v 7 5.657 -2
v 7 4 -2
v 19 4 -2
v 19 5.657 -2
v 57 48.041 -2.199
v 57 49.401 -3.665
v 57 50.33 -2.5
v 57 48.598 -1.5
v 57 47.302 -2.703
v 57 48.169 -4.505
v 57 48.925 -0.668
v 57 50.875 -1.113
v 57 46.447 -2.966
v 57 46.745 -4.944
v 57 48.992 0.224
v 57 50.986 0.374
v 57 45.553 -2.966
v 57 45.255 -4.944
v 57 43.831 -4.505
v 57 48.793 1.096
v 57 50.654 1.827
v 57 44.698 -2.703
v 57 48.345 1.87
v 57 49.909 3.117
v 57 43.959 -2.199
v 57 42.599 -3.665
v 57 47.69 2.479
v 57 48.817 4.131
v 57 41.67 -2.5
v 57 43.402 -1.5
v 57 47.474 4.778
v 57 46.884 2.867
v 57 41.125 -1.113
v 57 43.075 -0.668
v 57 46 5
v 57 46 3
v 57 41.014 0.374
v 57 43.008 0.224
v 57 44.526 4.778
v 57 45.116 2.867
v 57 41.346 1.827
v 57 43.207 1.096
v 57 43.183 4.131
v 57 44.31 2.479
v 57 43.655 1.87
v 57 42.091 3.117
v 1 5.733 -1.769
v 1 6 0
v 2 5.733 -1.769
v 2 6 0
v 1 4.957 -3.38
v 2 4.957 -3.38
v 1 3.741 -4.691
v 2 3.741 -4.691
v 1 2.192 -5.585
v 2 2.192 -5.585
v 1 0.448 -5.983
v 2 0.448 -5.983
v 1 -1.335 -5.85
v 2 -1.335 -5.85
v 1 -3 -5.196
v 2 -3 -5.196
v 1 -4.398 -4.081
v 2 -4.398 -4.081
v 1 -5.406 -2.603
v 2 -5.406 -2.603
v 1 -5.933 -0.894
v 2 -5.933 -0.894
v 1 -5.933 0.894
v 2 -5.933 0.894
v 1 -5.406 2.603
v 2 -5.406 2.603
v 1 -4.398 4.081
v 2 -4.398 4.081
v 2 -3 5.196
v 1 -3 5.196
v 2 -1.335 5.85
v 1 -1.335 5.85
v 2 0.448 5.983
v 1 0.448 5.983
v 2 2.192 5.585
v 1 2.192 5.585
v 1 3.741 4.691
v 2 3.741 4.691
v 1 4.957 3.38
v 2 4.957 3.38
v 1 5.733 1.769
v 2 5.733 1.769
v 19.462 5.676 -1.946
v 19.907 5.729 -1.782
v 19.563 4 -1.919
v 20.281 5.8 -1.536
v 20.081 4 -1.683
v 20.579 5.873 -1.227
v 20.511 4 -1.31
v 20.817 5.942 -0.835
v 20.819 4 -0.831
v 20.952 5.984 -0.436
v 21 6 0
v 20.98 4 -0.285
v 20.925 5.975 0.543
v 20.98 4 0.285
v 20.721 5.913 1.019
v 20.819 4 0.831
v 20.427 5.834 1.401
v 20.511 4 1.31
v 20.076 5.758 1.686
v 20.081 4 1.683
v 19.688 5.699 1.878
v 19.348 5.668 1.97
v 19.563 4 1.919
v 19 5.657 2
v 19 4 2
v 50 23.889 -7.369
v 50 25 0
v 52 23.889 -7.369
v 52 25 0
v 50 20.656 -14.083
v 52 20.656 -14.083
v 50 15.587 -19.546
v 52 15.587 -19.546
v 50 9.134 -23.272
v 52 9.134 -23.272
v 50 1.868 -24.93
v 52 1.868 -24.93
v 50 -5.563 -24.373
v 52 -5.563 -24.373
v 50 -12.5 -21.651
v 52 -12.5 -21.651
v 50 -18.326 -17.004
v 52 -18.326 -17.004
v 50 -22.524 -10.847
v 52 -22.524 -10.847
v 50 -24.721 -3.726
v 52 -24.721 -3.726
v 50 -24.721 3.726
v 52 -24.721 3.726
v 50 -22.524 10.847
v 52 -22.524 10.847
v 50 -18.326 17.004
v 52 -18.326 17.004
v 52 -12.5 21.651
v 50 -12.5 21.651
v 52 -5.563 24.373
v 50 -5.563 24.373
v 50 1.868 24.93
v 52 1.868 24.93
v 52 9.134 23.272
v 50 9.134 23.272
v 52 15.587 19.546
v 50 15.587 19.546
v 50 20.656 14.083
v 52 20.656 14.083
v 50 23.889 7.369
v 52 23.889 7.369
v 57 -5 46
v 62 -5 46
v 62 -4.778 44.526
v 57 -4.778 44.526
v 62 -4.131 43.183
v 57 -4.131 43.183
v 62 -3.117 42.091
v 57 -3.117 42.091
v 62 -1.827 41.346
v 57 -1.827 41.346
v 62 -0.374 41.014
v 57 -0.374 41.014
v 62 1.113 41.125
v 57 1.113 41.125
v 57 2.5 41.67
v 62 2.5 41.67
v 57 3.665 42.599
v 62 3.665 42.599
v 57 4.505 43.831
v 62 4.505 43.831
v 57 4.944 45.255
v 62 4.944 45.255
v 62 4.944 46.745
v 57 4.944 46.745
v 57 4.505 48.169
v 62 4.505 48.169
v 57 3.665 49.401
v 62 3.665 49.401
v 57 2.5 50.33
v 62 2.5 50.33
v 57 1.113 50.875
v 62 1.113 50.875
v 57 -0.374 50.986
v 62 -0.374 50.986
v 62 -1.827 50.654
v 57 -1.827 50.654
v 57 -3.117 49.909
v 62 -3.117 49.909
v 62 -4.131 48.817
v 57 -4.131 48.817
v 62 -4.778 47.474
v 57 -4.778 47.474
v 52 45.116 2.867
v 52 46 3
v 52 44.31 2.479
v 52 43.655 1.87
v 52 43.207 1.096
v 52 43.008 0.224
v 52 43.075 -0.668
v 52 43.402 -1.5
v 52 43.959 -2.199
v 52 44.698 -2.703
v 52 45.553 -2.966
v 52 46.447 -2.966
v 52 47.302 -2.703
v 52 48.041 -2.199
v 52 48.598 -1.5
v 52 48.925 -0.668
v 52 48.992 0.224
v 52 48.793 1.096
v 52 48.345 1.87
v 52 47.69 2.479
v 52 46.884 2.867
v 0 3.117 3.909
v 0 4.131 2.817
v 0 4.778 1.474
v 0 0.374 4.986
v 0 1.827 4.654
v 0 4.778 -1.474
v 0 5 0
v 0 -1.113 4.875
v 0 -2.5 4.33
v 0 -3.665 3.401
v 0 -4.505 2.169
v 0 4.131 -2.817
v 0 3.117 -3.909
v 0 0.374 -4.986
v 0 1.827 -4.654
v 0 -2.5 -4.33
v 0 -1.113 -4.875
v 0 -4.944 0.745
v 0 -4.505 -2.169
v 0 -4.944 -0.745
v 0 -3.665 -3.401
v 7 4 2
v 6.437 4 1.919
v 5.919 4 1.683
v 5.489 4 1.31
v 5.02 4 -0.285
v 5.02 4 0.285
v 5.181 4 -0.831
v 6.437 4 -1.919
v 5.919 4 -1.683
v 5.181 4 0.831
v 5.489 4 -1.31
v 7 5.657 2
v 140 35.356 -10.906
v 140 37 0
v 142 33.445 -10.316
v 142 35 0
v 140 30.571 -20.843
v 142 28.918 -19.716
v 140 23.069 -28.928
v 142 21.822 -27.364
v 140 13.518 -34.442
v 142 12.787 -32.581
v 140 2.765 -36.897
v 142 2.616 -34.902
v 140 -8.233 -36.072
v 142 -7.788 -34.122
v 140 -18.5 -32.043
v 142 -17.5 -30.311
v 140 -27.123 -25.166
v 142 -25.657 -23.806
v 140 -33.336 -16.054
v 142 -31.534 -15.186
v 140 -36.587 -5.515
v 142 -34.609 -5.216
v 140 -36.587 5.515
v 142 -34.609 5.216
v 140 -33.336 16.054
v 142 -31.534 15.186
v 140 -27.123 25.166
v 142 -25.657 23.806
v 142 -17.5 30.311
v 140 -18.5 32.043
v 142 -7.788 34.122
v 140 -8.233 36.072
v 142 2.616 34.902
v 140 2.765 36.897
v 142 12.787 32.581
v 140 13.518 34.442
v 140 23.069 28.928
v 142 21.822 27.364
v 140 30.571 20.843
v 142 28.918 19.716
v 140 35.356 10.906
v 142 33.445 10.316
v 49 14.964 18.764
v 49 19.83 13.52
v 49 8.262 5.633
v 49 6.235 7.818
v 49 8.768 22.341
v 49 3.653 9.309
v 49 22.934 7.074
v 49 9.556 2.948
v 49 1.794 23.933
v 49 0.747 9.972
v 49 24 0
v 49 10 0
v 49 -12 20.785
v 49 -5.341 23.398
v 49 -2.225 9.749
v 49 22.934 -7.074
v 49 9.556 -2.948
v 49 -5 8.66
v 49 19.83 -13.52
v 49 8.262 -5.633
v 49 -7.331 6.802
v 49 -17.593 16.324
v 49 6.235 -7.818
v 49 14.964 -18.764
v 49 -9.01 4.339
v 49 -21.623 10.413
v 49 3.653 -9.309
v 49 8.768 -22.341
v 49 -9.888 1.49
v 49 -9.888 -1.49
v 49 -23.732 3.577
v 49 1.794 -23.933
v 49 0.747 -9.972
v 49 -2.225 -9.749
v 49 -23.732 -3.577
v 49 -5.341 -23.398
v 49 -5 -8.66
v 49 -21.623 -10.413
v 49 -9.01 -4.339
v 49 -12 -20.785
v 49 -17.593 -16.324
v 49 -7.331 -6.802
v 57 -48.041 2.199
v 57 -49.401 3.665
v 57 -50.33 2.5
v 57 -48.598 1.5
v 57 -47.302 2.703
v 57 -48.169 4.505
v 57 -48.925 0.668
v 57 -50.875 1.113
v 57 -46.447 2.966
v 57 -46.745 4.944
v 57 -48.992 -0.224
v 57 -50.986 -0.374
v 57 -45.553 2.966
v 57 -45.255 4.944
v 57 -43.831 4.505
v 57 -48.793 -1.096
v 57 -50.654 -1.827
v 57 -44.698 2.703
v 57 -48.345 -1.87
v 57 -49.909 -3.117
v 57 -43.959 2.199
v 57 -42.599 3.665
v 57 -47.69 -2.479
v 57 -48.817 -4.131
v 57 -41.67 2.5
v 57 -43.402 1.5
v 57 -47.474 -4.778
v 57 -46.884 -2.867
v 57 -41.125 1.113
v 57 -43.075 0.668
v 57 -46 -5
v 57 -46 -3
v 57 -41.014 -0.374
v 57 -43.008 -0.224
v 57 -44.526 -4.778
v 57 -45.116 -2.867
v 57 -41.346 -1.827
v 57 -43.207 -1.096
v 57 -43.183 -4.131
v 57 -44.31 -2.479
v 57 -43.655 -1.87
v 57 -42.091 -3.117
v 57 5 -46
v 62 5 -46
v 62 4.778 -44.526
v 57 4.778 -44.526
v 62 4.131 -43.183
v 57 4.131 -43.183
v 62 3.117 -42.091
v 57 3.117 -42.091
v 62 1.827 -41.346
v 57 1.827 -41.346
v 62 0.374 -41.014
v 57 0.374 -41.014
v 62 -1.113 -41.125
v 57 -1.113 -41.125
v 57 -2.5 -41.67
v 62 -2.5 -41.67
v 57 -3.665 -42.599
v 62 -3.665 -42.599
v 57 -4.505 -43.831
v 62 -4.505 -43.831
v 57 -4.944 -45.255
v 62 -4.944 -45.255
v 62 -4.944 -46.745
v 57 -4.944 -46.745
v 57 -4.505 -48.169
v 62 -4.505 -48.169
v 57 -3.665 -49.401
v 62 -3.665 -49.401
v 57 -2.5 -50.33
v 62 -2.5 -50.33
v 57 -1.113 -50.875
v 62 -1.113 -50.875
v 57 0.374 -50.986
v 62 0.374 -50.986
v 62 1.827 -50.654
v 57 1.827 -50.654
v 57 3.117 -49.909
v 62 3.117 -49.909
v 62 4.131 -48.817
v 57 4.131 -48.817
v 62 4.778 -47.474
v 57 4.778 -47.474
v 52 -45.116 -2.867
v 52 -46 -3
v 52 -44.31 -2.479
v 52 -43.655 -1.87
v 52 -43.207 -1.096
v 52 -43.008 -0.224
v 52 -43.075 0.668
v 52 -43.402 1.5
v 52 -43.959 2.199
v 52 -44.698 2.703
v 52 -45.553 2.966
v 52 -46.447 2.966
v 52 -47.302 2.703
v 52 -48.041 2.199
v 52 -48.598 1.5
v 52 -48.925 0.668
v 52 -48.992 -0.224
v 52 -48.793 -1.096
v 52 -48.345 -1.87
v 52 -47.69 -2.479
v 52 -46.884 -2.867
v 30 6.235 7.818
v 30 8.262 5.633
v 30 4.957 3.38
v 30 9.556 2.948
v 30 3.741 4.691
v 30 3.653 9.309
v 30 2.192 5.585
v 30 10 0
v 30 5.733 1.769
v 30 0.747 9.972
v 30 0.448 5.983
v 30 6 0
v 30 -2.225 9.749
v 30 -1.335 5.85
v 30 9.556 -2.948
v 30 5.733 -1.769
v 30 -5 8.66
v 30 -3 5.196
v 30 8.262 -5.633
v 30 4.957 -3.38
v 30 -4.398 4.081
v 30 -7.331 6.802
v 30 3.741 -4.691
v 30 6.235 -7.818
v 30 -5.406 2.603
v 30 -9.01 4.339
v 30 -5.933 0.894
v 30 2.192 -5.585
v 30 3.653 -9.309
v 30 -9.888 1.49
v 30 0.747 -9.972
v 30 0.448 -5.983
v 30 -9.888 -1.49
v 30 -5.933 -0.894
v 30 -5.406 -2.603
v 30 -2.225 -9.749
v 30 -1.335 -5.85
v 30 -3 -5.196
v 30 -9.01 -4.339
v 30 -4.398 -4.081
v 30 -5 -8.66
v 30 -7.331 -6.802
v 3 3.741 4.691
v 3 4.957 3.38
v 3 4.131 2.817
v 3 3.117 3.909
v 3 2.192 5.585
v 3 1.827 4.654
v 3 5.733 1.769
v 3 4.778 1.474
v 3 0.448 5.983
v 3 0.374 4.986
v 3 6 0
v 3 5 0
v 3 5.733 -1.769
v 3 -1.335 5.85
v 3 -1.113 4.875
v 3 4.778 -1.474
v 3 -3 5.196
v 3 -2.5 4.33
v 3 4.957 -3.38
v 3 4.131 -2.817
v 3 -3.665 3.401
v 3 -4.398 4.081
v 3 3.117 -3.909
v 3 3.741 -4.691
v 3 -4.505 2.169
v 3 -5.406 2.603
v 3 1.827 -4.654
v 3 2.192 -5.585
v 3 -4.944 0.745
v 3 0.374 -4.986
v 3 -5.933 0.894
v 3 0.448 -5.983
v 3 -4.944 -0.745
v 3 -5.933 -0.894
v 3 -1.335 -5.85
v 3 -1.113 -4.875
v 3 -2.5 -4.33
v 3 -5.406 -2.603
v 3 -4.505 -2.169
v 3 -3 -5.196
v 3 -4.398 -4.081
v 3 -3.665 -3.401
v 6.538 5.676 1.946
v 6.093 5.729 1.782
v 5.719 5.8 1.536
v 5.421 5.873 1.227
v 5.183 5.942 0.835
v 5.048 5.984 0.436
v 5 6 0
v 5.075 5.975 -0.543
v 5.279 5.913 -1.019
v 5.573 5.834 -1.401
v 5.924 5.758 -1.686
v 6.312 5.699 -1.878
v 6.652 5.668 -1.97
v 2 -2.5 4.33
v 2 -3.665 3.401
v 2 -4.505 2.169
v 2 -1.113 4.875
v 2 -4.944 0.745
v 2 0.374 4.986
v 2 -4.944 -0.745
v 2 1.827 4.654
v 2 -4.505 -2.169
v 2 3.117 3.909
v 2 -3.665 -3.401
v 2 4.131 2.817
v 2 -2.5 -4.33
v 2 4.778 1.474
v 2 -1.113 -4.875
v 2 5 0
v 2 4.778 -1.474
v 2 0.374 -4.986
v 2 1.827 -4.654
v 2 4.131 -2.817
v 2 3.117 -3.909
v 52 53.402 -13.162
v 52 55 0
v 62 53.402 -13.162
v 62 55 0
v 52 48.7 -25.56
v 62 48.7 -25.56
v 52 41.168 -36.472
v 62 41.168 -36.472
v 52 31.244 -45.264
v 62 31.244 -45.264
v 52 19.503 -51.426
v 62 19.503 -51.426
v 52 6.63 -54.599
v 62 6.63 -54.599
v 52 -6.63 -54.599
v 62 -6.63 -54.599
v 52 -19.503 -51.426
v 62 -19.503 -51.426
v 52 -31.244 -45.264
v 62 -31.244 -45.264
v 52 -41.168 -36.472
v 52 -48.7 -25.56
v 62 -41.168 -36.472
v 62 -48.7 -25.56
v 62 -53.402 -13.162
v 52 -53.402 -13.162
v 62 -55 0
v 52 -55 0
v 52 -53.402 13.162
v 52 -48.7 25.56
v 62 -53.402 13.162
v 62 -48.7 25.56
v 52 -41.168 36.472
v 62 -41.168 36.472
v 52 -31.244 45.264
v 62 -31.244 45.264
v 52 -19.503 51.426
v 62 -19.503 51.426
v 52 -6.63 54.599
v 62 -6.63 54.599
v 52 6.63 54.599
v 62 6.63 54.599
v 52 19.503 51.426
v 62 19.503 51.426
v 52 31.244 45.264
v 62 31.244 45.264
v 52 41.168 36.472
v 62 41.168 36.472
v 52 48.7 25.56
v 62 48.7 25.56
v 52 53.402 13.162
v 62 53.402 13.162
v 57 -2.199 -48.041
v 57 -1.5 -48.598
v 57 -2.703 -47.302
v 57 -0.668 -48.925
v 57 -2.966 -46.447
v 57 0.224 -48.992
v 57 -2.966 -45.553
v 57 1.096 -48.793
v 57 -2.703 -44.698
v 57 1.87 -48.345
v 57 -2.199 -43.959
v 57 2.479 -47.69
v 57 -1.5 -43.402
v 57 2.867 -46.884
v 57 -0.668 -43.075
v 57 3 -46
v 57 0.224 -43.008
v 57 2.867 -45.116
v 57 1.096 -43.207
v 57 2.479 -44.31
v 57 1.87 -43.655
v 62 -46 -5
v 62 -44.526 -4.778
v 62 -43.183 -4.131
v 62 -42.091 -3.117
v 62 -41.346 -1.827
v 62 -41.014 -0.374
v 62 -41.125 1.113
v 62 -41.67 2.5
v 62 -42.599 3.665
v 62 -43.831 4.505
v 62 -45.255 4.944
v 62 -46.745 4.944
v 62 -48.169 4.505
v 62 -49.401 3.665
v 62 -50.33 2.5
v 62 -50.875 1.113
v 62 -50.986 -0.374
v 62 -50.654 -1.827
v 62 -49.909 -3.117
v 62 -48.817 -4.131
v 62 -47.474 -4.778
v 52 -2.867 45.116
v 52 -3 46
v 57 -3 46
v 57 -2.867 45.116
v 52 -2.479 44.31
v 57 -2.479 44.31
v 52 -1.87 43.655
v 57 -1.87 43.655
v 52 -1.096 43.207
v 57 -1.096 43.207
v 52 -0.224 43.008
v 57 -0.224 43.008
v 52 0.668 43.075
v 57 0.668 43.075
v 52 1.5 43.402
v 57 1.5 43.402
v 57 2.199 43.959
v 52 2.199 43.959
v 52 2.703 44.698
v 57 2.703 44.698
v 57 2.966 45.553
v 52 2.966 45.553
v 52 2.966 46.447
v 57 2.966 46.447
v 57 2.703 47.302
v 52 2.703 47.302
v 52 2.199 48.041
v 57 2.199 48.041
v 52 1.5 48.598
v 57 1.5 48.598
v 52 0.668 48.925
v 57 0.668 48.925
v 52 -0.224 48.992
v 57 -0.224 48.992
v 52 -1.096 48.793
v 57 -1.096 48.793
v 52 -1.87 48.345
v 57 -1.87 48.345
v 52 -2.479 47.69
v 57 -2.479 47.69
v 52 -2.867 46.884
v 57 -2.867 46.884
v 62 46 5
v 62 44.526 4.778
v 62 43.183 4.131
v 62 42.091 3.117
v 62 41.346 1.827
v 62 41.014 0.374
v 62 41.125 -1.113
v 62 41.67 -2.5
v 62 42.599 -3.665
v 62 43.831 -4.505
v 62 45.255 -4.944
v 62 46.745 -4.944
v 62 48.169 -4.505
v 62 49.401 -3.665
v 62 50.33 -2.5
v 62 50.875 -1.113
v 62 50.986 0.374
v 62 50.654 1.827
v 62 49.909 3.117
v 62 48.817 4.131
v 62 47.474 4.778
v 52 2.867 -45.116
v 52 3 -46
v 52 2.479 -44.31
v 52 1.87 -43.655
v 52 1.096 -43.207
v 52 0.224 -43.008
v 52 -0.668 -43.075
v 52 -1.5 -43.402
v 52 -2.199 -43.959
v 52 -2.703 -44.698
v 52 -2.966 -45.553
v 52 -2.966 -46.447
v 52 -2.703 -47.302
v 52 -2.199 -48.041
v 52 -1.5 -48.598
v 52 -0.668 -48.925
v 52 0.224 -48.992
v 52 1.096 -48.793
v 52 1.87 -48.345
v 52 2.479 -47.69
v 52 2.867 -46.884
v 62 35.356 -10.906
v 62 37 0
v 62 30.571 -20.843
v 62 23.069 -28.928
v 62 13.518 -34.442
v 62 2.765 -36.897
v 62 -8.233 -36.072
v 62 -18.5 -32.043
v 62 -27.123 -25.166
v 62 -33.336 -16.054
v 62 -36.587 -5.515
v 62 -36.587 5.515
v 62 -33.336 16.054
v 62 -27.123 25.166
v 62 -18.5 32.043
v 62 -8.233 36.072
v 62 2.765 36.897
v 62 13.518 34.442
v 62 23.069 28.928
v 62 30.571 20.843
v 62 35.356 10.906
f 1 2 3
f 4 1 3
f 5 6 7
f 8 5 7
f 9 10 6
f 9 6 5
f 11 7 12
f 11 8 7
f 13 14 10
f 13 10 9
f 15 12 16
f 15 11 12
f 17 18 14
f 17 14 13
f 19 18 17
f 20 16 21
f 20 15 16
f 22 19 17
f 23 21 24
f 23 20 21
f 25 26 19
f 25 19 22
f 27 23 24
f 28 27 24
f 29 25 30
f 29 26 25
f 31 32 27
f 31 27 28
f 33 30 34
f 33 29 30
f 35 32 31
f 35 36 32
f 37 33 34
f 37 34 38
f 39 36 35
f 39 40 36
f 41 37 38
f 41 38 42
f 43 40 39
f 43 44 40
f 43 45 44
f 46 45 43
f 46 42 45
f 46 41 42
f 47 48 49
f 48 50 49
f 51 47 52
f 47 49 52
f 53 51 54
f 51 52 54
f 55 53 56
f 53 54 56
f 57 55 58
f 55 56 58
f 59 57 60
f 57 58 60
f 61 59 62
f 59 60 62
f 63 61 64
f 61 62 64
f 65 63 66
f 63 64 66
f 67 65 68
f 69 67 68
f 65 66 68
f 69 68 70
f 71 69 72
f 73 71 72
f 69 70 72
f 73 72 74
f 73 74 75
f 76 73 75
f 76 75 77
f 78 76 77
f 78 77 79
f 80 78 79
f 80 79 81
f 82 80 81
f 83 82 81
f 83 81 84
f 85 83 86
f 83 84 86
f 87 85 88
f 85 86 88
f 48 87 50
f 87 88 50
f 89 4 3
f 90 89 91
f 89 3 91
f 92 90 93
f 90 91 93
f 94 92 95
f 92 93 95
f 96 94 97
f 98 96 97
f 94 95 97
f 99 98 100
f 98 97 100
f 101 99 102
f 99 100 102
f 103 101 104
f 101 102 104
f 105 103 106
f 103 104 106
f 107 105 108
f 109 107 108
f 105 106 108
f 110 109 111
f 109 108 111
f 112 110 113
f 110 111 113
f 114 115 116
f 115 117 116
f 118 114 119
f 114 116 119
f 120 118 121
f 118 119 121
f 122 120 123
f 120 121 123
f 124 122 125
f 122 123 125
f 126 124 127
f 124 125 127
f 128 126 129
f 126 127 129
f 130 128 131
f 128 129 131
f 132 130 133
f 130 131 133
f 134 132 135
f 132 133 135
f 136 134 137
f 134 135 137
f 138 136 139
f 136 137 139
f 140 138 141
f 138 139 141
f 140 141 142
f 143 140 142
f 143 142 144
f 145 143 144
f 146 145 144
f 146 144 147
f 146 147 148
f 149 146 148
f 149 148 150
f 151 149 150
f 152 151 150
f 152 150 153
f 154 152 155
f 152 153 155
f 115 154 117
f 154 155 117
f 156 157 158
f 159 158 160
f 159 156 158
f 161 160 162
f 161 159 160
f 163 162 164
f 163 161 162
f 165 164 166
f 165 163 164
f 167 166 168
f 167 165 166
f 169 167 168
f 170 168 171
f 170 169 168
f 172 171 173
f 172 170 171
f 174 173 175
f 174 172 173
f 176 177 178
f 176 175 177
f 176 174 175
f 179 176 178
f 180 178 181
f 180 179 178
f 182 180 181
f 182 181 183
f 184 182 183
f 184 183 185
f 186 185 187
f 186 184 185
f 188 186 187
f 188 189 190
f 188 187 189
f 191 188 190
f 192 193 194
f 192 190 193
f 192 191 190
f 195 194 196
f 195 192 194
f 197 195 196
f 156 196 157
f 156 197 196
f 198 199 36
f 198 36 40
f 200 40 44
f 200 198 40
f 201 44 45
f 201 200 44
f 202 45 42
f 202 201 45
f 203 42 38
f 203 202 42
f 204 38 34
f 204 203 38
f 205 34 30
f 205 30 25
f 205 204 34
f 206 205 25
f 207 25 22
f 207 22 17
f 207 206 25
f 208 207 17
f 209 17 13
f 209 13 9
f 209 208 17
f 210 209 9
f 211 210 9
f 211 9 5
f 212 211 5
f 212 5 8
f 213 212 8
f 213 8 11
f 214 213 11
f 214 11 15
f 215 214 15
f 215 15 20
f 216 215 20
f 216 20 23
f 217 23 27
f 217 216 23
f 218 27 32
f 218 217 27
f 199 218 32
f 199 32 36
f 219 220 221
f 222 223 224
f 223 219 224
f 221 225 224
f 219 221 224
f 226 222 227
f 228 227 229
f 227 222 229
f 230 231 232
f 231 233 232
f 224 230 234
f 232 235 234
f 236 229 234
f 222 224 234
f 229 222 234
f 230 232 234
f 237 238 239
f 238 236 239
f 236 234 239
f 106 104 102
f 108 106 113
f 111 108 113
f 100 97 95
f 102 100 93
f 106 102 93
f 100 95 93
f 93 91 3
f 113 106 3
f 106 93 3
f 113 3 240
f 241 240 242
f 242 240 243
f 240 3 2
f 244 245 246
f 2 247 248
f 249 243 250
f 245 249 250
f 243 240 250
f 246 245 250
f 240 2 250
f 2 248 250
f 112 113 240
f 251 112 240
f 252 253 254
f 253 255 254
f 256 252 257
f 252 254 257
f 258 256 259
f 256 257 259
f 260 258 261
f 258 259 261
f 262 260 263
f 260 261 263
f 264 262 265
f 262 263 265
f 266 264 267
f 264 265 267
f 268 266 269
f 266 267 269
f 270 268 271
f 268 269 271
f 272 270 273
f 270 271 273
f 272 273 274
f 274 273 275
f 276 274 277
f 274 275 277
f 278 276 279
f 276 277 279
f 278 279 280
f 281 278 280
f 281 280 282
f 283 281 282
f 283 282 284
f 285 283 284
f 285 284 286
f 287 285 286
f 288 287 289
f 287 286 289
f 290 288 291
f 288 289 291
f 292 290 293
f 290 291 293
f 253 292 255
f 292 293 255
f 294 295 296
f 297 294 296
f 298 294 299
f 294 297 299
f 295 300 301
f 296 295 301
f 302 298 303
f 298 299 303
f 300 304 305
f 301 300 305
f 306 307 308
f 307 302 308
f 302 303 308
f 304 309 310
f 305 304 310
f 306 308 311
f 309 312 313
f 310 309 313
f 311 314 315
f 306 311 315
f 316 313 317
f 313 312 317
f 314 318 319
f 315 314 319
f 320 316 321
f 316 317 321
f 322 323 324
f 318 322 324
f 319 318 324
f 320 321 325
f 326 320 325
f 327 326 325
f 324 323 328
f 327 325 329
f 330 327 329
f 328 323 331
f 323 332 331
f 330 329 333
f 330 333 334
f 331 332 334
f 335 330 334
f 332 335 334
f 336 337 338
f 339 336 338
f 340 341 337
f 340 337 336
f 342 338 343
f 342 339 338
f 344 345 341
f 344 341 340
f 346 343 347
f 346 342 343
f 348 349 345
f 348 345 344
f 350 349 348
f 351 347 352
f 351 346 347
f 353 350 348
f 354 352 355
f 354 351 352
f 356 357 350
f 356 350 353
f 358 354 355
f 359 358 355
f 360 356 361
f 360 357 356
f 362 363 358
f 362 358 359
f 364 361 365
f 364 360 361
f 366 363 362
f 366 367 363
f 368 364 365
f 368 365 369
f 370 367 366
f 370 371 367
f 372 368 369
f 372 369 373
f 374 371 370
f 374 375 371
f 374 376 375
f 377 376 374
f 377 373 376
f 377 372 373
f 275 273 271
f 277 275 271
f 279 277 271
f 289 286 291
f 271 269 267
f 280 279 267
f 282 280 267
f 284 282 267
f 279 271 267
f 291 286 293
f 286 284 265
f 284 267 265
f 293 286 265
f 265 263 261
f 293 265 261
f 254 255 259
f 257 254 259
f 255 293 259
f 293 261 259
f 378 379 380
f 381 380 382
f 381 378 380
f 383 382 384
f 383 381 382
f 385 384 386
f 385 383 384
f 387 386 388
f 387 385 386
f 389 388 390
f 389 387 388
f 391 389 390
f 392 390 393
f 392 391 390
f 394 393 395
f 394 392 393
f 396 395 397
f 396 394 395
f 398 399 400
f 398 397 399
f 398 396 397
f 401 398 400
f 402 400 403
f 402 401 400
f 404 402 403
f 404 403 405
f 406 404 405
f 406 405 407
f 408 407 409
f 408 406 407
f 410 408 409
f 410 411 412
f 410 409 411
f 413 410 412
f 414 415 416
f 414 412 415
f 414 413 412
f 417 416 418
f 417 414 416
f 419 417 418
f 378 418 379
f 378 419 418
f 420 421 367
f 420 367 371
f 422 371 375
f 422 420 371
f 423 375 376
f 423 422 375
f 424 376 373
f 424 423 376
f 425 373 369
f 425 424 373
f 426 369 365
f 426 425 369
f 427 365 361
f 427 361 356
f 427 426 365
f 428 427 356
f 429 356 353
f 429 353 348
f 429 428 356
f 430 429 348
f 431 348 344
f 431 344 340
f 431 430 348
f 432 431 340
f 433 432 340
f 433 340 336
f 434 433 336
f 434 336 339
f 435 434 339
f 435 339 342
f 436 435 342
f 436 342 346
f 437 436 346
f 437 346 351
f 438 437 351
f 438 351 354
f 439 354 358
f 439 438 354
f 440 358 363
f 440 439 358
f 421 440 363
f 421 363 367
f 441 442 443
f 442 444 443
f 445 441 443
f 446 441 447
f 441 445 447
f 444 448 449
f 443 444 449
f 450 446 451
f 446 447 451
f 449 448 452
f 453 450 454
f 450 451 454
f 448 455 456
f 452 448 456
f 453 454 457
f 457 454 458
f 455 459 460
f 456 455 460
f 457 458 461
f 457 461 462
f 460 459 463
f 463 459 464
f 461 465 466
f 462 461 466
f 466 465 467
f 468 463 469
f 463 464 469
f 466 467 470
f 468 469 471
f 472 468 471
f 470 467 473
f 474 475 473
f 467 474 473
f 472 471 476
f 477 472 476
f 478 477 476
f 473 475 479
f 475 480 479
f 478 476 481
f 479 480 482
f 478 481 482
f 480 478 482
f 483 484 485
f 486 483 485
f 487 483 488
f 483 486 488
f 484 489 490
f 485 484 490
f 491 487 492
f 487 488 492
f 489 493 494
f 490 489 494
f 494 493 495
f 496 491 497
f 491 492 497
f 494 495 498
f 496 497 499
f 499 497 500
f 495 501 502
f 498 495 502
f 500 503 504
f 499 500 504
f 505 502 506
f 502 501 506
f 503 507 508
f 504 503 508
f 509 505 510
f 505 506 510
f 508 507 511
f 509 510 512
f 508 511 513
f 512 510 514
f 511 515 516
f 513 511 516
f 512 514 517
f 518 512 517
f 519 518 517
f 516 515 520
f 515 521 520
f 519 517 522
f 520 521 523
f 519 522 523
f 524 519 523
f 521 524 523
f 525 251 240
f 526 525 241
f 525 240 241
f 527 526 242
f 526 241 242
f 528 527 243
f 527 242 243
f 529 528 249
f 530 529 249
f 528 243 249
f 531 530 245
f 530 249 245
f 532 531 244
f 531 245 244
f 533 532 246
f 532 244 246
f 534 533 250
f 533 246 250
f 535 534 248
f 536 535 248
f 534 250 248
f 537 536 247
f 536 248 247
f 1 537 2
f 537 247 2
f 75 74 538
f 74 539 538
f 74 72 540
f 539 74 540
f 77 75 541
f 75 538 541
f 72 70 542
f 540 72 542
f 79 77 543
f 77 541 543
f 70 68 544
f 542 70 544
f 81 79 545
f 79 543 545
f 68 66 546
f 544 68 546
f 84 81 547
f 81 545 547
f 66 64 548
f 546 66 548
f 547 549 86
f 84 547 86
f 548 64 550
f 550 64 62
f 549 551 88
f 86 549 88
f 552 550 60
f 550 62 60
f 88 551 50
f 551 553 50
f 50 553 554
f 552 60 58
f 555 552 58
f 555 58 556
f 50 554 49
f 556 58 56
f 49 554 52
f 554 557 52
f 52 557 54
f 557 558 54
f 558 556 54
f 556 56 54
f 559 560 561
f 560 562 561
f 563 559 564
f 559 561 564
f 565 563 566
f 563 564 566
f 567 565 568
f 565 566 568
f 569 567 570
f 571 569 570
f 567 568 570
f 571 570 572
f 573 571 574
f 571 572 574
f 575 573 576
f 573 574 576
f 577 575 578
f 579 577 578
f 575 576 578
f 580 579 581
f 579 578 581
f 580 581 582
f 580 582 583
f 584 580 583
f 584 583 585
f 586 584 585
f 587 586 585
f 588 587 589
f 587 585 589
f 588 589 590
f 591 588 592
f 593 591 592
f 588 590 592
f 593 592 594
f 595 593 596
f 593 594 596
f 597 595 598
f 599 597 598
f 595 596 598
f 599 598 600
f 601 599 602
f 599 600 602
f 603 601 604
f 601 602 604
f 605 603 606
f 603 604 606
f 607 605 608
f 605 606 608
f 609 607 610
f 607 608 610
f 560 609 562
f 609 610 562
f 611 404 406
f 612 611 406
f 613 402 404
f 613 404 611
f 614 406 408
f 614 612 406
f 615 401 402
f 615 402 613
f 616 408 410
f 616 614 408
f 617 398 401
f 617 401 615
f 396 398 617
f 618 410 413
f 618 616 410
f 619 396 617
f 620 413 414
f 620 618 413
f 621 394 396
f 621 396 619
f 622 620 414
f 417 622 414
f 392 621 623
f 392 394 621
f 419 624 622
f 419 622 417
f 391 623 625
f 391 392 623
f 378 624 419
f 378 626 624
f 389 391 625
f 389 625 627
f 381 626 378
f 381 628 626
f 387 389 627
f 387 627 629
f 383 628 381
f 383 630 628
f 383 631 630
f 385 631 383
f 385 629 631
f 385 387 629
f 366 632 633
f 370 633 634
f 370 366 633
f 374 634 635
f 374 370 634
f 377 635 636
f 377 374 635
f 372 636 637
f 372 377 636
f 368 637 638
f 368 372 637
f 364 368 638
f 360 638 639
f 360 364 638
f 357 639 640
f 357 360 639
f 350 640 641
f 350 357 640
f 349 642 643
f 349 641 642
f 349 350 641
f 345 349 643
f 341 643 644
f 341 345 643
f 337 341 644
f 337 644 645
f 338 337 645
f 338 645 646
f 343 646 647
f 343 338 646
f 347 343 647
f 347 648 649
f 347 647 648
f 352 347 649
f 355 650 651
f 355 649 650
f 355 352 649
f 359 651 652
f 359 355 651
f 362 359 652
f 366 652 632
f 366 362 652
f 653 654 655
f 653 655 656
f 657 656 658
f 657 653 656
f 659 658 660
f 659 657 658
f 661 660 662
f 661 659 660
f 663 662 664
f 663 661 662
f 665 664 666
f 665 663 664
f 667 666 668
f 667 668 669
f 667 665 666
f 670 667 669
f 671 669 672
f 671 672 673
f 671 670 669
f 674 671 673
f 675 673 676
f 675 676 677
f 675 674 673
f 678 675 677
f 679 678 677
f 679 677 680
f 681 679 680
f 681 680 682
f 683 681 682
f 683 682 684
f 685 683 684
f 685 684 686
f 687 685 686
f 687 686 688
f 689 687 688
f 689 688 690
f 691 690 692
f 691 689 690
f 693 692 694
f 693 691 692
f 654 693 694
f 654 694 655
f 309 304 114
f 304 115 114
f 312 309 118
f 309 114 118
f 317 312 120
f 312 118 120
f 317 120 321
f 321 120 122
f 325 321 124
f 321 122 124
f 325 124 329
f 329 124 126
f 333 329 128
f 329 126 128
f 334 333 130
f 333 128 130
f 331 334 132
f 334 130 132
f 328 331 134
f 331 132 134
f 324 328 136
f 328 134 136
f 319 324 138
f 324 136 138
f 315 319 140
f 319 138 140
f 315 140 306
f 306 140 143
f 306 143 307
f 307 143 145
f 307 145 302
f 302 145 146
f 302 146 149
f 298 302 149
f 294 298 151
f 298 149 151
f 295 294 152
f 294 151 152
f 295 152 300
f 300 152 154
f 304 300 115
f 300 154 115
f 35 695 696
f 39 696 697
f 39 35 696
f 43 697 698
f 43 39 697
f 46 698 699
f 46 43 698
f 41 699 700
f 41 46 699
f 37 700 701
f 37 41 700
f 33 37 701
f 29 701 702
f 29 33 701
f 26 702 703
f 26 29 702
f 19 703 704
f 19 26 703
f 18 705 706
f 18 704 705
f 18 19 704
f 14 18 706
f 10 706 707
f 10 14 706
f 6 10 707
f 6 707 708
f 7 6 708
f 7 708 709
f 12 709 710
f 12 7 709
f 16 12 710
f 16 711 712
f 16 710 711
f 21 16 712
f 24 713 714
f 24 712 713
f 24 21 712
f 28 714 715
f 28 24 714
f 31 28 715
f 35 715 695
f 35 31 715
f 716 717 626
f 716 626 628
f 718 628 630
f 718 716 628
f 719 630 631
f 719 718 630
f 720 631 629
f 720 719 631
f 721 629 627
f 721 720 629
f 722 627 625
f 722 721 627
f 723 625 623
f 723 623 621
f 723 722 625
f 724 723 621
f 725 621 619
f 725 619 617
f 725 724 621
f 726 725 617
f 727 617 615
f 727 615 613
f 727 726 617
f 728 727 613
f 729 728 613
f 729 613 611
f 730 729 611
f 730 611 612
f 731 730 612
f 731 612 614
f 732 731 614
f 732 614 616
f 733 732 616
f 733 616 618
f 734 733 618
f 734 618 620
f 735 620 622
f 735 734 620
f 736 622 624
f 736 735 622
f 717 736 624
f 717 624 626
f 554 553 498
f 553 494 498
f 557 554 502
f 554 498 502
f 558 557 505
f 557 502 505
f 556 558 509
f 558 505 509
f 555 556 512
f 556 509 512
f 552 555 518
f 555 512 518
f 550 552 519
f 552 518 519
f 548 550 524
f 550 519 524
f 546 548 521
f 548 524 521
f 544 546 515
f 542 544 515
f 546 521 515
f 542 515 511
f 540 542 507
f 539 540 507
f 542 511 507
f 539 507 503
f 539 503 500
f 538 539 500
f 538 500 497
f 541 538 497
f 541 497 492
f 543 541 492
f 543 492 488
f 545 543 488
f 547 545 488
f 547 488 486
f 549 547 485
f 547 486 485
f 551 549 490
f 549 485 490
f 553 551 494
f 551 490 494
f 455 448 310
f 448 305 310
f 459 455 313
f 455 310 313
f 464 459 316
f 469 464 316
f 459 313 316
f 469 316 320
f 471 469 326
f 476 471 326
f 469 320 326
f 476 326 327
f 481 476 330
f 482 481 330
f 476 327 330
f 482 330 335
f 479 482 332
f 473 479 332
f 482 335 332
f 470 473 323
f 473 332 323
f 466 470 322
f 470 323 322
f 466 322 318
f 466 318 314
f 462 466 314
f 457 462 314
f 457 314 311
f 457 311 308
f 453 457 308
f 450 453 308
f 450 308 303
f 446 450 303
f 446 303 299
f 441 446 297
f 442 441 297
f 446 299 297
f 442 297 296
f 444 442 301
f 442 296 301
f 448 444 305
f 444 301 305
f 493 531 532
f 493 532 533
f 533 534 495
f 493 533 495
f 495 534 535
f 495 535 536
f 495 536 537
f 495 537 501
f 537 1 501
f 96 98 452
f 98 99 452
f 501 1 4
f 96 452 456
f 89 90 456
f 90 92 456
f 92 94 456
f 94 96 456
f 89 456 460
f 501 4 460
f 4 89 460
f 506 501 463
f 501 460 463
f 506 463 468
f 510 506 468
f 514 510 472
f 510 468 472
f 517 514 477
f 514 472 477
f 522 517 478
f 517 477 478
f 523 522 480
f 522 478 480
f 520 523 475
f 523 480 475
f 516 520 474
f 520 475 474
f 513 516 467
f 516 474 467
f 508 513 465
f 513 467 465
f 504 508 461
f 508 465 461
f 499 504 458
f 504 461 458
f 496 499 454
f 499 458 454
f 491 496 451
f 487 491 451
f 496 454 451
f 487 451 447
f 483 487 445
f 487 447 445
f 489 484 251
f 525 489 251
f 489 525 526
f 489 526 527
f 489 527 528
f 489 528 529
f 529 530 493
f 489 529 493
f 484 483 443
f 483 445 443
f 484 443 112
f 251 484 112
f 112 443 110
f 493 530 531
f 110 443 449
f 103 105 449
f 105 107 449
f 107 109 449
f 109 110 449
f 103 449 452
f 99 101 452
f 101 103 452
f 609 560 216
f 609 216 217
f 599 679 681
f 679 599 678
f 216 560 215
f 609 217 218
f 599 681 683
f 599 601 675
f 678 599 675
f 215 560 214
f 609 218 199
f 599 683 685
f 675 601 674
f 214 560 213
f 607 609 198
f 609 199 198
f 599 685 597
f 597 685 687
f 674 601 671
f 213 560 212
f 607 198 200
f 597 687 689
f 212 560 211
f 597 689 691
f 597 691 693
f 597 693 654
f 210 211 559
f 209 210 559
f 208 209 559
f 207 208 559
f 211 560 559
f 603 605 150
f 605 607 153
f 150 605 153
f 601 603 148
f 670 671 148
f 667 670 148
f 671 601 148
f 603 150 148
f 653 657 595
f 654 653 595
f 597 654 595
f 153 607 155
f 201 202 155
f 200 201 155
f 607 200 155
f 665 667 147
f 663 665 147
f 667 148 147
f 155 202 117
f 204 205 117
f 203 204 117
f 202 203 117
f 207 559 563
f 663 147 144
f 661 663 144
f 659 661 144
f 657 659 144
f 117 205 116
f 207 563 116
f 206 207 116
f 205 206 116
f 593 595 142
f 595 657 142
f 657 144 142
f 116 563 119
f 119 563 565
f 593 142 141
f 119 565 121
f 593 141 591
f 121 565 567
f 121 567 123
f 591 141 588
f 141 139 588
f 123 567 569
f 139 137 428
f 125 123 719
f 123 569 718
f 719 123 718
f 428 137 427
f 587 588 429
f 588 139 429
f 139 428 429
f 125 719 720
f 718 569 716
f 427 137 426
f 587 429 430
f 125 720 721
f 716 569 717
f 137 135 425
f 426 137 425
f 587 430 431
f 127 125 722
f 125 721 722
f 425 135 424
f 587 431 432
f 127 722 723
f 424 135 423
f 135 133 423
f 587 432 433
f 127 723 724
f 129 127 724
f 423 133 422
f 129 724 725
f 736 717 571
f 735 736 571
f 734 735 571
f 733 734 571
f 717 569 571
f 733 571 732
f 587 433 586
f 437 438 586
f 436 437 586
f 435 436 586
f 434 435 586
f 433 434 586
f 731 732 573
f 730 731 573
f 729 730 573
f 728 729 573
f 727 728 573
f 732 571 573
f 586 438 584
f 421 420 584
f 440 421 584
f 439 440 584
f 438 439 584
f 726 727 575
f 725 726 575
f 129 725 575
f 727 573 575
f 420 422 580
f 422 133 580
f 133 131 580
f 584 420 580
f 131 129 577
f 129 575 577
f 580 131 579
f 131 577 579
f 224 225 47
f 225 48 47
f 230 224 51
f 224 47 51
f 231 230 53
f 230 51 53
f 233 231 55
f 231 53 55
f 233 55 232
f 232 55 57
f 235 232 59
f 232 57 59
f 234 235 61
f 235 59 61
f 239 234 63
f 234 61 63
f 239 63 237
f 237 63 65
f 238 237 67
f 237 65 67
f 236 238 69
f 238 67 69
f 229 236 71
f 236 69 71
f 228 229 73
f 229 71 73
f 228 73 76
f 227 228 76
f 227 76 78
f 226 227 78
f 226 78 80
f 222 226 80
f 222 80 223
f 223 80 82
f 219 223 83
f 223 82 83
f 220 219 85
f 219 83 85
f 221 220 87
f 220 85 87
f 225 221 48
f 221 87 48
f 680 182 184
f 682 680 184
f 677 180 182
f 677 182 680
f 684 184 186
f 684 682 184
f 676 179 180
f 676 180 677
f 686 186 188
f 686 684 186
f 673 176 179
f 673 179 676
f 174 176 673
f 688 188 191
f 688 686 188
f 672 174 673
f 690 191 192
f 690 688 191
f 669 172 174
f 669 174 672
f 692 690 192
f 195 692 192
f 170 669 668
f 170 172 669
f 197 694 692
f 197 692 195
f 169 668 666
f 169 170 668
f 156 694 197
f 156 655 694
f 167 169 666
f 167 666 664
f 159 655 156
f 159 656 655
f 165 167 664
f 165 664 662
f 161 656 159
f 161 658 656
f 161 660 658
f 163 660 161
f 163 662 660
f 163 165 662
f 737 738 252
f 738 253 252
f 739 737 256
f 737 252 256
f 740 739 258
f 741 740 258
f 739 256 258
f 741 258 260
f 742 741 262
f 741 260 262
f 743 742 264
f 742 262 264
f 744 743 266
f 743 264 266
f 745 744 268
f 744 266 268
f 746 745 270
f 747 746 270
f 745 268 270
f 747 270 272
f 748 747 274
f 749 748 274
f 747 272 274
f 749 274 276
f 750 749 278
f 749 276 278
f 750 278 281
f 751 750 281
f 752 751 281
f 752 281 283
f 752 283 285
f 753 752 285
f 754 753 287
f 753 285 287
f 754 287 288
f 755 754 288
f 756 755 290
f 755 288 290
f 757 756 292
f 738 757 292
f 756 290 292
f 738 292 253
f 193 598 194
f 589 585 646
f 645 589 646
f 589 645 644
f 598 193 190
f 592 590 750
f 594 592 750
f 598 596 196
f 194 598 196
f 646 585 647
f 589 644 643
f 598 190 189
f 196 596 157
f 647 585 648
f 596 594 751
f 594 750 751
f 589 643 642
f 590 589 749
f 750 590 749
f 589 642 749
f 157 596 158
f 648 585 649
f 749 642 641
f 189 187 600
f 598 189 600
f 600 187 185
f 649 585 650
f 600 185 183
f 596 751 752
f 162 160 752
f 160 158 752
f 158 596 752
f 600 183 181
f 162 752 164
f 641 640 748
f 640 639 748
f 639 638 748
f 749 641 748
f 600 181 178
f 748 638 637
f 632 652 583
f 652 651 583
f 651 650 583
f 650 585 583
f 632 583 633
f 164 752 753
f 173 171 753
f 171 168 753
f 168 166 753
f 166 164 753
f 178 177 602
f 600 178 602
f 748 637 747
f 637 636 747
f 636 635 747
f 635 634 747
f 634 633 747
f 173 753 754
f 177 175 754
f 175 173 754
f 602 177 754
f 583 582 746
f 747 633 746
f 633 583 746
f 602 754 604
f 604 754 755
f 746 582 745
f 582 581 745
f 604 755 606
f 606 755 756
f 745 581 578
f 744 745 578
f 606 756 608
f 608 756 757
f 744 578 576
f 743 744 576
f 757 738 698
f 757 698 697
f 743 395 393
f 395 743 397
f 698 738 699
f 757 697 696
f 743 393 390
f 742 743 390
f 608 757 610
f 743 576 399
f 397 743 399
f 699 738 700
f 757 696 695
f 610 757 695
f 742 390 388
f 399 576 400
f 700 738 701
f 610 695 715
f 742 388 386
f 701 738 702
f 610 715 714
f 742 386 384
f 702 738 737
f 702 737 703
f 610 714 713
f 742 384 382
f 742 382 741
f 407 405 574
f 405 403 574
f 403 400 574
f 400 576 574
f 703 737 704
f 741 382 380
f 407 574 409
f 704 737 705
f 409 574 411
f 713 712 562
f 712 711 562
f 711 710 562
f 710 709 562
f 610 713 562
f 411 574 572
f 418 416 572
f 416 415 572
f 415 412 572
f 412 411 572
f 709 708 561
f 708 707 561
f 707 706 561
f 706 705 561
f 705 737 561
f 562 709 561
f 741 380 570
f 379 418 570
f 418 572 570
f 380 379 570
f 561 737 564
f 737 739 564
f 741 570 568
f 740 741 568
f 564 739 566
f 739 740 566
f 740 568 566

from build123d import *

# Parameters (mm, degrees)
R_P_TITION_CIRCULAIRE1_COUNT = 4
ENL_V_MAT_EXTRU_1_DEPTH      = 10


with BuildPart() as part:
    # Esquisse1 → Révolution1 (revolve)
    with BuildSketch(Plane.XY):
        Polygon((0, 0), (0, 5), (1, 6), (2, 6), (2, 5), (3, 5), (3, 6), (30, 6), (30, 10), (49, 10), (49, 24), (50, 25), (52, 25), (52, 55), (62, 55), (62, 37), (140, 37), (142, 35), (142, 0), align=None)
    revolve(axis=Axis((142, 0, 0), (-1, 0, 0)))

    # Esquisse2 → Enlèvement de matière-Révolution1 (revolve, cut)
    with BuildSketch(Plane.XY, mode=Mode.PRIVATE) as enl_vement_de_mati_re_r_volution1_sk:
        Polygon((44.05702844, 46), (69.730898062, 46), (69.730898062, 51), (57, 51), (57, 49), (44.05702844, 49), align=None)
    enl_vement_de_mati_re_r_volution1 = revolve(enl_vement_de_mati_re_r_volution1_sk.sketch.rotate(Axis((44.05702844, 46, 0), (1, 0, 0)), 90), axis=Axis((44.05702844, 46, 0), (1, 0, 0)), mode=Mode.SUBTRACT)  # turned: the seam where the file's is

    # Répétition circulaire1: Enlèvement de matière-Révolution1 ×4 about axis
    r_p_tition_circulaire1_axis = Axis((0, 0, 0), (1, 0, 0))
    for i in range(1, R_P_TITION_CIRCULAIRE1_COUNT):
        add(enl_vement_de_mati_re_r_volution1.rotate(r_p_tition_circulaire1_axis, i * 360 / R_P_TITION_CIRCULAIRE1_COUNT), mode=Mode.SUBTRACT)

    # Esquisse3 → Enlèv. mat.-Extru.1 (cut)
    with BuildSketch(Plane(origin=(0, 4, 0), x_dir=(1, 0, 0), z_dir=(0, 1, 0))):
        with BuildLine():
            Line((7, 2), (19, 2))
            ThreePointArc((19, 2), (21, 0), (19, -2))
            Line((19, -2), (7, -2))
            ThreePointArc((7, -2), (5, 0), (7, 2))
        make_face()
    extrude(amount=ENL_V_MAT_EXTRU_1_DEPTH, mode=Mode.SUBTRACT)


solid = part.part
